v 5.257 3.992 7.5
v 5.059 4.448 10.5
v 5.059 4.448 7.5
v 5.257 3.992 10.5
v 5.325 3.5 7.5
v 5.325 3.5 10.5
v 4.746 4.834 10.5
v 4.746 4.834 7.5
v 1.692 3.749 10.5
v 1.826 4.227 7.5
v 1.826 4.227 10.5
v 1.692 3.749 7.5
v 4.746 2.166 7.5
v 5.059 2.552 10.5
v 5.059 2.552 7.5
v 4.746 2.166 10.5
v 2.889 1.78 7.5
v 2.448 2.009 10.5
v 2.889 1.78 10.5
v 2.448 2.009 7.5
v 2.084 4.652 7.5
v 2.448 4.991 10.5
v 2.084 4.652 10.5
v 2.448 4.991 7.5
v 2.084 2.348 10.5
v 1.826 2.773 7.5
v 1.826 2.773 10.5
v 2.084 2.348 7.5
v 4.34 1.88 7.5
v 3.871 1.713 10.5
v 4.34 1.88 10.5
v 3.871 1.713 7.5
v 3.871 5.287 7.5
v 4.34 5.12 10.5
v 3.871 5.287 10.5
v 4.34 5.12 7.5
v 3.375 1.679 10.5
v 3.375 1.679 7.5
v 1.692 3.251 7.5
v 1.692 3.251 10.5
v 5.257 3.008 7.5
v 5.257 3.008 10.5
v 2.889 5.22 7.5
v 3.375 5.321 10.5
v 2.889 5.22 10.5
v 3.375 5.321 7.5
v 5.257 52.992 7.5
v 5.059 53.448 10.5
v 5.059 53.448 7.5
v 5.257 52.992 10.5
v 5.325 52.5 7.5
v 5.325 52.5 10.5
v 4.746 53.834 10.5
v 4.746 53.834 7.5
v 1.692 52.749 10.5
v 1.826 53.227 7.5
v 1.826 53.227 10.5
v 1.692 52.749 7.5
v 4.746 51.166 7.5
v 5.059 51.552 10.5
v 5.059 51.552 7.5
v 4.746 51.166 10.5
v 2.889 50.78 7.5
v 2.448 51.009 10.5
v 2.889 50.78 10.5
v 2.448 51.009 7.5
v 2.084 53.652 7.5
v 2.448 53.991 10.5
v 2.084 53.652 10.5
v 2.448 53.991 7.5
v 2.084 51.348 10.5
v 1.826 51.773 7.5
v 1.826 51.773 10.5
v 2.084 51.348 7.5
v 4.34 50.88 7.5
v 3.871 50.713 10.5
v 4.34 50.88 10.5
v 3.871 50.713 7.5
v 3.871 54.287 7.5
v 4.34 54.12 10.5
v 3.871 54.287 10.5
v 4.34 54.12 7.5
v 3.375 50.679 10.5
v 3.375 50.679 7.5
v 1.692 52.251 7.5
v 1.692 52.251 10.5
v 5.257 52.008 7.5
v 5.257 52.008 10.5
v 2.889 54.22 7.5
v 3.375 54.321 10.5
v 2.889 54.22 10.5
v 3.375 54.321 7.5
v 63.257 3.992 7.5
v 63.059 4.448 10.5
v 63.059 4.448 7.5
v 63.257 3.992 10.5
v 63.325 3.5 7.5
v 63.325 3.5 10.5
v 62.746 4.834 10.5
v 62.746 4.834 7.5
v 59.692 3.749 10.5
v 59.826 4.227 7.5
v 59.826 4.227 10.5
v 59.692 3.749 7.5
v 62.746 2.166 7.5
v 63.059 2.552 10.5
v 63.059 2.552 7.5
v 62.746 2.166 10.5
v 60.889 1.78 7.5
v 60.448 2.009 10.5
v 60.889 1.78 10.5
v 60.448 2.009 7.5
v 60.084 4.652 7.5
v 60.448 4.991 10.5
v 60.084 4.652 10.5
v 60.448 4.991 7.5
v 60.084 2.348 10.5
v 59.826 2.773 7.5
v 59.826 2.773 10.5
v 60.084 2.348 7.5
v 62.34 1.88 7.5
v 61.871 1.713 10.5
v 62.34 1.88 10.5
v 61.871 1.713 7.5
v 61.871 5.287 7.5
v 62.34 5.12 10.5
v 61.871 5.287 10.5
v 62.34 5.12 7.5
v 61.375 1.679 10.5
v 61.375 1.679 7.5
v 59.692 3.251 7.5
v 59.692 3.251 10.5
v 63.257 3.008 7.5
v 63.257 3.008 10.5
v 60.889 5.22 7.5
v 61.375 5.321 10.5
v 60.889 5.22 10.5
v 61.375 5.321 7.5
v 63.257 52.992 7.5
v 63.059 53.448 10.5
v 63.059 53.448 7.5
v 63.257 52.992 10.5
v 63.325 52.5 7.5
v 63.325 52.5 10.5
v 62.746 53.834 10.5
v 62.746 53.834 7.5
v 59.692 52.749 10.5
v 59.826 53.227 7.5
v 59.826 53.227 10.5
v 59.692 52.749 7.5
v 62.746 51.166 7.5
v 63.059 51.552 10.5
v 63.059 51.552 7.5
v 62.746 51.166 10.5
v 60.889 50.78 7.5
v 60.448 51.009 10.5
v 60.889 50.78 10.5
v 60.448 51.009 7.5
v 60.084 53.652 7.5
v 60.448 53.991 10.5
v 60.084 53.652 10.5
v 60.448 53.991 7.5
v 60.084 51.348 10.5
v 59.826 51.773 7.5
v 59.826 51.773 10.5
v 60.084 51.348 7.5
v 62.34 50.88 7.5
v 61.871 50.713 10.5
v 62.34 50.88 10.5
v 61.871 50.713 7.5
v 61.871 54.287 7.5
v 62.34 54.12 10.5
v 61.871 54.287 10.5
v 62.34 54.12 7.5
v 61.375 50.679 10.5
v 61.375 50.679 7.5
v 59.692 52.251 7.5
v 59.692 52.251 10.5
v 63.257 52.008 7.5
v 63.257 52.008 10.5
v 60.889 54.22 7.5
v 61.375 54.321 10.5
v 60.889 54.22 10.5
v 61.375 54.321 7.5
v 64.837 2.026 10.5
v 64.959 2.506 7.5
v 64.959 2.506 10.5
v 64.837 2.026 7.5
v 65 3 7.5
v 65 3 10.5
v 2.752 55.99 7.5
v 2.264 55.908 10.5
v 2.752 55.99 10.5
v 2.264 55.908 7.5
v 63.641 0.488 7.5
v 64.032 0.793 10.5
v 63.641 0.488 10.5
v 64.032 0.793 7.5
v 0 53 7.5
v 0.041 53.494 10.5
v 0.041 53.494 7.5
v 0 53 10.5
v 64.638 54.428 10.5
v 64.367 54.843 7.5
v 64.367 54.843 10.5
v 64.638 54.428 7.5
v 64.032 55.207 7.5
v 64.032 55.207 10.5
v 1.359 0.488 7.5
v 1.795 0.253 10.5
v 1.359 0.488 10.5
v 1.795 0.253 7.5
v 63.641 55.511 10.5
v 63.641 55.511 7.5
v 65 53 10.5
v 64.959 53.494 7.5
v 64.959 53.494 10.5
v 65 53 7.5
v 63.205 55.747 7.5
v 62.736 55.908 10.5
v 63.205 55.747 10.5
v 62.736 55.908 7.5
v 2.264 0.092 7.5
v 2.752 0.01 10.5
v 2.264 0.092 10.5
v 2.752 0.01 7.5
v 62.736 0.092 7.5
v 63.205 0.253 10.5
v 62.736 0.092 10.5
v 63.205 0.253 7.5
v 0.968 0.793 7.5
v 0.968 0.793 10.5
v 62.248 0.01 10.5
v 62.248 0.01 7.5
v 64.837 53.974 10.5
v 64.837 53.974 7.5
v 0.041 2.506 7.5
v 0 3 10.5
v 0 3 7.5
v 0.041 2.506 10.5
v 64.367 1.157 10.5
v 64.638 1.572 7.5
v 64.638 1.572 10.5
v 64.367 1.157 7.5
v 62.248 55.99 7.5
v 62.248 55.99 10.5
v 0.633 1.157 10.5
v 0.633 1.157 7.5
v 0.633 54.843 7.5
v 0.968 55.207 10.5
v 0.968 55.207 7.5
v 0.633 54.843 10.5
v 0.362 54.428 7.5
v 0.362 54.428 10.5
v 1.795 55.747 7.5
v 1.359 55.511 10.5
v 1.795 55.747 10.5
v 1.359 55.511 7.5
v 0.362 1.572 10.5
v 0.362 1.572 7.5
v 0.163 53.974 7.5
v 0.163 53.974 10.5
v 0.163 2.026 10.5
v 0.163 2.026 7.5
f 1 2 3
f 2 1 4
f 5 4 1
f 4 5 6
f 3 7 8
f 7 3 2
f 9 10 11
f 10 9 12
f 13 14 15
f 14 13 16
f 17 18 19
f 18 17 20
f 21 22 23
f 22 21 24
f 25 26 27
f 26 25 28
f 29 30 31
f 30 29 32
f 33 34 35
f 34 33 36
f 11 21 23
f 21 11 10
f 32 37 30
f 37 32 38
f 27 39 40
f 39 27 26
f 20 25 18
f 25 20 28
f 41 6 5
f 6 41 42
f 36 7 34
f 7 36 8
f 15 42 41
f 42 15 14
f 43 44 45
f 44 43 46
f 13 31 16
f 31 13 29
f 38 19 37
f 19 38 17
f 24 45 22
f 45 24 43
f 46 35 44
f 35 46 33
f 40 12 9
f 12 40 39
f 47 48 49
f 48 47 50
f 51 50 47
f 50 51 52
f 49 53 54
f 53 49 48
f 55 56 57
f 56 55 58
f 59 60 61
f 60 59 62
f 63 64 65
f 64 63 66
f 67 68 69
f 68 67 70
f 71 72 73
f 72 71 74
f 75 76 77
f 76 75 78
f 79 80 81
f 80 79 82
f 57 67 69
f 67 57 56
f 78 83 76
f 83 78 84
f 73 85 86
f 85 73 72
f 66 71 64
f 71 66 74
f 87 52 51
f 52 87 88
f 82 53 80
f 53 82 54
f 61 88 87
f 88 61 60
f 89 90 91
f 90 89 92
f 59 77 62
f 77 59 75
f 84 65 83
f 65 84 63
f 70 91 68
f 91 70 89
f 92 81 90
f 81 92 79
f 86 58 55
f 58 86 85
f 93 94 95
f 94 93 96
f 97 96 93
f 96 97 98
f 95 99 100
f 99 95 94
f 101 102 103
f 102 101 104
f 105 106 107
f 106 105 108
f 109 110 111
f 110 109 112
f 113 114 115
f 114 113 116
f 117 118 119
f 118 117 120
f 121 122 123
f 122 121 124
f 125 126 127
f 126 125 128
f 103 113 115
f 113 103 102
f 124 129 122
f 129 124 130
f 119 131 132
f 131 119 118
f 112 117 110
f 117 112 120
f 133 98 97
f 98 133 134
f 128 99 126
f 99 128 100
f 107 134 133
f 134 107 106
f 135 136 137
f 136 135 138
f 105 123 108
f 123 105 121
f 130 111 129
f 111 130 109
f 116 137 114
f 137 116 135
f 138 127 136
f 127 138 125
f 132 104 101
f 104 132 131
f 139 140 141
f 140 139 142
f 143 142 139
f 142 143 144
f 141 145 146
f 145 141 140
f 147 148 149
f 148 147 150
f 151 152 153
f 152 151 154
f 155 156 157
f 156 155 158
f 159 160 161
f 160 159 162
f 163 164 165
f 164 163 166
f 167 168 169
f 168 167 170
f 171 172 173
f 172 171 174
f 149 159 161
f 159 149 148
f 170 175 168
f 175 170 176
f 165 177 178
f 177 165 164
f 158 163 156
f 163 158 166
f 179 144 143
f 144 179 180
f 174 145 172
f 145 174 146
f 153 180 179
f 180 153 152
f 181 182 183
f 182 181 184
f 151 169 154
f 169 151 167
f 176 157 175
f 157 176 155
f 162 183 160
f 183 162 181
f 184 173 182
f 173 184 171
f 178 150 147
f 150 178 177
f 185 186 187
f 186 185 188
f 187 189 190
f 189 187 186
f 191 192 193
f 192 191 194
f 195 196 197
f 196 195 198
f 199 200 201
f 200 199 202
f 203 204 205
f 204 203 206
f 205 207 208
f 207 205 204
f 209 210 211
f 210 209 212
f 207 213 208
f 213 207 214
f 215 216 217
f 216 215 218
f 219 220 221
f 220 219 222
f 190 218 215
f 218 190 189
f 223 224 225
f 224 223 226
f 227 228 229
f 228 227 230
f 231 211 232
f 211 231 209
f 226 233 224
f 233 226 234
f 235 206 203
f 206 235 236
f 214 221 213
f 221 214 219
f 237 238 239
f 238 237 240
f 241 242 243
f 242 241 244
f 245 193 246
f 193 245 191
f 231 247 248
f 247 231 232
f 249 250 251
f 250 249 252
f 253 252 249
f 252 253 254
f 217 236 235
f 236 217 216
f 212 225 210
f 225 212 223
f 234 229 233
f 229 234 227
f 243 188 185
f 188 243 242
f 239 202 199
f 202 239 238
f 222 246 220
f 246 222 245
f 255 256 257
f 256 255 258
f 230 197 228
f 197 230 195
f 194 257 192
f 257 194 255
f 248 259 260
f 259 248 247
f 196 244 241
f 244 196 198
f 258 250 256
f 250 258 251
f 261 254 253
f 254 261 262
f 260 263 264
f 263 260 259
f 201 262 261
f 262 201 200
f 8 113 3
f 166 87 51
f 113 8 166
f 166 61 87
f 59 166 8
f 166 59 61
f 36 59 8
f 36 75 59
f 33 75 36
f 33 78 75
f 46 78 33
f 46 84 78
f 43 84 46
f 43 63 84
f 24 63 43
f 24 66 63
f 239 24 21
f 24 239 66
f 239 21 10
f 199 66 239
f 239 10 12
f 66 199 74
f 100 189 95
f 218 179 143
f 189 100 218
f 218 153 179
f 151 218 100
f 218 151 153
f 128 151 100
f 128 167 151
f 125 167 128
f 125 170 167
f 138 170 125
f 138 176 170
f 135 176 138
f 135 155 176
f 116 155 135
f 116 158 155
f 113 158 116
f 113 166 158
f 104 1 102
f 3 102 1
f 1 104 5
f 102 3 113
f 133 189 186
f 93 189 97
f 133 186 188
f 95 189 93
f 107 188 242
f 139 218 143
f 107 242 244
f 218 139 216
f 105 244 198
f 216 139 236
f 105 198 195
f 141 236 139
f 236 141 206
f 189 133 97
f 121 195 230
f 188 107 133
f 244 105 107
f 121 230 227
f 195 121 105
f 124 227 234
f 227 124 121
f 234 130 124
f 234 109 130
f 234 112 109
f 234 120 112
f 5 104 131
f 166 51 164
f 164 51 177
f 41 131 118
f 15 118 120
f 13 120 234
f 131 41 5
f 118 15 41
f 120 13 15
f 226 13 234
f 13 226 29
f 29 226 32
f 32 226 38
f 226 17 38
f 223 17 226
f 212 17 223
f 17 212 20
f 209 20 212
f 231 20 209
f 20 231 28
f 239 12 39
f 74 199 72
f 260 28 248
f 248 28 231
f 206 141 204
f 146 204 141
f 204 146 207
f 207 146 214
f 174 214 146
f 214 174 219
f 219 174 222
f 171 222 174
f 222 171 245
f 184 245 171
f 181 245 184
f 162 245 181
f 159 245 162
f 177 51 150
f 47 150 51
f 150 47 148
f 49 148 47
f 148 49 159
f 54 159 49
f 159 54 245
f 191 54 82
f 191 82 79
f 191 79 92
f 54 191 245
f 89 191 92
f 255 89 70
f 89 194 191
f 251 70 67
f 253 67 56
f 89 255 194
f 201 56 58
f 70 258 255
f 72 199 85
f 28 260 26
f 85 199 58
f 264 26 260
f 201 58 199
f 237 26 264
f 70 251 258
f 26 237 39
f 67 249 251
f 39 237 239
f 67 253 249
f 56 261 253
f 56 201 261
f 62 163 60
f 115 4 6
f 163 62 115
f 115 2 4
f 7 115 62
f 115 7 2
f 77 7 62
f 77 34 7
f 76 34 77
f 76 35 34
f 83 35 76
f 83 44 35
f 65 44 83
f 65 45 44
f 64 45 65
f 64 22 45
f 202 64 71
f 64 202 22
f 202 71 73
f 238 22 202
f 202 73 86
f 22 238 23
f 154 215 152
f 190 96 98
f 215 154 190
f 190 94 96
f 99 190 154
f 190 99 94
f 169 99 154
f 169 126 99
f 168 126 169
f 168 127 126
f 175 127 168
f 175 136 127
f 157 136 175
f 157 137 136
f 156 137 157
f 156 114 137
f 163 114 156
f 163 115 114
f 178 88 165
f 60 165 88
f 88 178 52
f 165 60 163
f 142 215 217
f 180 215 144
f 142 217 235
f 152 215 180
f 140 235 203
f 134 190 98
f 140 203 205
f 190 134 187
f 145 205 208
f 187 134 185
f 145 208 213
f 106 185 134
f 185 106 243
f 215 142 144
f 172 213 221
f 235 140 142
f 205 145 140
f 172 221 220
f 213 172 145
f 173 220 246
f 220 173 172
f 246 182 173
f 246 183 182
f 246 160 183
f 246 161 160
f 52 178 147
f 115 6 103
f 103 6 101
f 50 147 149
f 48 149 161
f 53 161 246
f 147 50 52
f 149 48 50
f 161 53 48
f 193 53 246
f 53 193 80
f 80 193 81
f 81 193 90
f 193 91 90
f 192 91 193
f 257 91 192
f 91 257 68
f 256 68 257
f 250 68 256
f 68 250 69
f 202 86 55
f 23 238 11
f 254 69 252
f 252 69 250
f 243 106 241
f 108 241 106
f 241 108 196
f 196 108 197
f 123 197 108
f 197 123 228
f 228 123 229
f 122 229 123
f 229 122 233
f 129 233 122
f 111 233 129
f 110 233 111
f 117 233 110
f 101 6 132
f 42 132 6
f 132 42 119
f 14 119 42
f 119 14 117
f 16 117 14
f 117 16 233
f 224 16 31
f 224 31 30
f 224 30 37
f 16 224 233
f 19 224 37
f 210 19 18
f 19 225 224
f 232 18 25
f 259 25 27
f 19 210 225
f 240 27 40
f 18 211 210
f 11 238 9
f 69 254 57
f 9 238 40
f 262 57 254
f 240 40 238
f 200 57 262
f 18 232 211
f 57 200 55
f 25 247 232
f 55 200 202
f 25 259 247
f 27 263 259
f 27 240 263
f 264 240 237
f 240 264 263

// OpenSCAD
$fa=0.5;
$fs=0.5;

RPiFootprintHeight = 3;
standoffHeight = 6;

// create an array holding 4 locations for mounting holes // 3, 62, 3, 53
footprintPadding = 12;

module corner(height=RPiFootprintHeight) {
    color("cyan")
    cylinder(r=3, h=height, center=true);
}

module RPiMountingHole(h=20) {
    //cylinder(r=3.1, h=19, center=true); // pads
    cylinder(r=1.825, h=h, center=true);
}

module baseMountingHole(h=20) {
    cylinder(r=3, h=h, center=true);
}

module standoff() {
    color("cyan")
    difference() {
        cylinder(r=2.75, h=standoffHeight, center=true);
        cylinder(r=1.825, h=standoffHeight*1.1, center=true);
    }
}

// base
// need base mounting holes
/*difference() {
    
    hull() {
        for (x=[3 - footprintPadding, 62 + footprintPadding]) { 
            for (y=[3 - footprintPadding, 53 + footprintPadding]) { 
                translate([x, y, 0])
                    corner();
            }
        }
    }
    
    // holes
    for (x=[3.5, 61.5]) { 
        for (y=[3.5, 52.5]) { 
            translate([x, y, 0])
                RPiMountingHole();
        }
    }
    
    // corners
    for (x=[6 - footprintPadding, 59 + footprintPadding]) { 
        for (y=[6 - footprintPadding, 50 + footprintPadding]) { 
            translate([x, y, 0])
            corner(height=10);
        }
    }
}*/



// standoffs
/*for (x=[3.5, 61.5]) { 
    for (y=[3.5, 52.5]) { 
        translate([x, y, standoffHeight/2 + RPiFootprintHeight/2])
            standoff();
    }
}*/

// RPi footprint
difference() {
    color("red")
    hull() {
        for (x=[3, 62]) { 
            for (y=[3, 53]) { 
                translate([x, y, standoffHeight + RPiFootprintHeight])
                    corner();
            }
        }
    }

    // holes
    for (x=[3.5, 61.5]) { 
        for (y=[3.5, 52.5]) { 
            translate([x, y, 0])
                RPiMountingHole(40);
        }
    }
}
    
